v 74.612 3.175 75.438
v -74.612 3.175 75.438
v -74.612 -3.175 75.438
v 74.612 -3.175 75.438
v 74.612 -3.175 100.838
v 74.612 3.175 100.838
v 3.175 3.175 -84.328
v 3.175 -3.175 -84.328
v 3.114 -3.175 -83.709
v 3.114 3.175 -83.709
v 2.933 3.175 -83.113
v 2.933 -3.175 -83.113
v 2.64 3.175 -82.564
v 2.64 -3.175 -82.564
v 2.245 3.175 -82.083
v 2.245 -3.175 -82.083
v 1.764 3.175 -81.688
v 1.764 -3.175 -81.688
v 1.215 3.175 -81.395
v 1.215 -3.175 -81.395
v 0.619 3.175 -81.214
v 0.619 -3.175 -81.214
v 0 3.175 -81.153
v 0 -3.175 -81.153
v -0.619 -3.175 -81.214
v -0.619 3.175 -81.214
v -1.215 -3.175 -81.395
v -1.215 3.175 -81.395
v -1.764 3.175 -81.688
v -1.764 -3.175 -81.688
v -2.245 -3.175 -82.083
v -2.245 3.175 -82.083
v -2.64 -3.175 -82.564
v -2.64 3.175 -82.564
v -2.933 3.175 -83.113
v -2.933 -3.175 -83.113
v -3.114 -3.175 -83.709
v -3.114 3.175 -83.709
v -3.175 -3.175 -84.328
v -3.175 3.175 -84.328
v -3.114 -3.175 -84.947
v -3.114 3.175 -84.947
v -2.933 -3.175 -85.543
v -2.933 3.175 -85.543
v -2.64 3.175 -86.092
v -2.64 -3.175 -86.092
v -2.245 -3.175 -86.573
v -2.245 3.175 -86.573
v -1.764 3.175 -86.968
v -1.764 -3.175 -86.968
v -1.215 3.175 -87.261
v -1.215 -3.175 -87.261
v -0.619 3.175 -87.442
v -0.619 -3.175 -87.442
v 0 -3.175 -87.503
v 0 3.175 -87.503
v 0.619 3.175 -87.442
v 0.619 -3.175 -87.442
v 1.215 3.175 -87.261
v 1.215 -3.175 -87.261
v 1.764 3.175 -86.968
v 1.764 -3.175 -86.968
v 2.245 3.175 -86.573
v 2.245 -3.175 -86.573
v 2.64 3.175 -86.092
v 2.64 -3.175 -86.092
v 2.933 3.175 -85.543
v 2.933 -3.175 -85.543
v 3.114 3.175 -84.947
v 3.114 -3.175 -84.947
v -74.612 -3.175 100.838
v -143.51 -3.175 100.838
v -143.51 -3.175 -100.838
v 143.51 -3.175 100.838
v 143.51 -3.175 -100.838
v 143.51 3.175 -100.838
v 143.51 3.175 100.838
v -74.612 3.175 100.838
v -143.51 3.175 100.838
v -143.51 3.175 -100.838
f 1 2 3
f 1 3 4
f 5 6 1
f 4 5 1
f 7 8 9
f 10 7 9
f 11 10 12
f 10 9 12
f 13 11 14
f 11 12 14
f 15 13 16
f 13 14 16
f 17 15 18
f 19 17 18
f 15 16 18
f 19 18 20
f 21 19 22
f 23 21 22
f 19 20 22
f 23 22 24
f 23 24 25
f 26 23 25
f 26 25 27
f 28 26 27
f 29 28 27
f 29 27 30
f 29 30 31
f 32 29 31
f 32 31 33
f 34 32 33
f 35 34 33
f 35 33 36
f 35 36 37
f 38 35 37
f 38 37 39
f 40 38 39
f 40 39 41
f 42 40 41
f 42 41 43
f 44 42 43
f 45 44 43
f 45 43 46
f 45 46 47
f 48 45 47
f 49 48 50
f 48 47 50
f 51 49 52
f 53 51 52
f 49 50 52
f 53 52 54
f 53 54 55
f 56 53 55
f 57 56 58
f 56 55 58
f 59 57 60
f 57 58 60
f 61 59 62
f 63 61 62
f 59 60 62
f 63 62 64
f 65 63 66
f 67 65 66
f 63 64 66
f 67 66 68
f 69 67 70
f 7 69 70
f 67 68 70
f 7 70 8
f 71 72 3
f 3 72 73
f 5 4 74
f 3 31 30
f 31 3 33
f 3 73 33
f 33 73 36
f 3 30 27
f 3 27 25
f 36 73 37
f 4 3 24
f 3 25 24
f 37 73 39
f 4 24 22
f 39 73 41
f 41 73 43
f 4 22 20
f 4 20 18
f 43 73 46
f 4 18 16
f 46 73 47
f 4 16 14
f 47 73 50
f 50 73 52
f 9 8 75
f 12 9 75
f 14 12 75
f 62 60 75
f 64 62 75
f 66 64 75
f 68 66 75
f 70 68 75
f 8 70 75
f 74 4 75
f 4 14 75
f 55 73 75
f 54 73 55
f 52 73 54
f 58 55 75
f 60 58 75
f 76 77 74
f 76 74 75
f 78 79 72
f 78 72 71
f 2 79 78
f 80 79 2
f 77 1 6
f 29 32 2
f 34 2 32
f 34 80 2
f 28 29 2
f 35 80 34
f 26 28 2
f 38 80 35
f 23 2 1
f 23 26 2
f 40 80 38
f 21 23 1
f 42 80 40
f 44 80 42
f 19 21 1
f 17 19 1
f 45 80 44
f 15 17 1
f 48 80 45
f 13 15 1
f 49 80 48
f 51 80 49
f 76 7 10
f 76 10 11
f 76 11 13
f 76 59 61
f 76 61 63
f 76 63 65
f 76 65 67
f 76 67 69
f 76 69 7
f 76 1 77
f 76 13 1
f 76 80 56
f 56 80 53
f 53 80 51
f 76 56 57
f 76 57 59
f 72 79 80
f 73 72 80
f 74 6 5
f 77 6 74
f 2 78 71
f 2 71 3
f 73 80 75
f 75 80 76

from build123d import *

# Parameters (mm, degrees)
SKETCH1_W               = 287.02
SKETCH1_H               = 201.676
BOSS_EXTRUDE1_DEPTH     = 3.175
SKETCH2_W               = 149.225
SKETCH2_H               = 25.4
CUT_EXTRUDE1_DEPTH      = 1
CUT_EXTRUDE1_DEPTH_BACK = 7.35
SKETCH3_R               = 3.175
CUT_EXTRUDE2_DEPTH      = 1
CUT_EXTRUDE2_DEPTH_BACK = 7.35


with BuildPart() as part:
    # Sketch1 → Boss-Extrude1 (new body, symmetric)
    with BuildSketch(Plane(origin=(0, 0, 0), x_dir=(1, 0, 0), z_dir=(0, 1, 0))):
        Rectangle(SKETCH1_W, SKETCH1_H)
    extrude(amount=BOSS_EXTRUDE1_DEPTH, both=True)

    # Sketch2 → Cut-Extrude1 (cut, two sides)
    with BuildSketch(Plane(origin=(0, 3.175, 0), x_dir=(1, 0, 0), z_dir=(0, 1, 0))) as cut_extrude1_sk:
        with Locations((0, -88.138)):
            Rectangle(SKETCH2_W, SKETCH2_H)
    extrude(amount=CUT_EXTRUDE1_DEPTH, mode=Mode.SUBTRACT)
    extrude(cut_extrude1_sk.sketch, amount=-CUT_EXTRUDE1_DEPTH_BACK, mode=Mode.SUBTRACT)

    # Sketch3 → Cut-Extrude2 (cut, two sides)
    with BuildSketch(Plane.XZ.offset(3.175)) as cut_extrude2_sk:
        with Locations((41.91, 88.138)):
            Circle(SKETCH3_R)
        with Locations((0, -84.328)):
            Circle(SKETCH3_R)
        with Locations((-41.91, 88.138)):
            Circle(SKETCH3_R)
    extrude(amount=CUT_EXTRUDE2_DEPTH, mode=Mode.SUBTRACT)
    extrude(cut_extrude2_sk.sketch, amount=-CUT_EXTRUDE2_DEPTH_BACK, mode=Mode.SUBTRACT)


solid = part.part
